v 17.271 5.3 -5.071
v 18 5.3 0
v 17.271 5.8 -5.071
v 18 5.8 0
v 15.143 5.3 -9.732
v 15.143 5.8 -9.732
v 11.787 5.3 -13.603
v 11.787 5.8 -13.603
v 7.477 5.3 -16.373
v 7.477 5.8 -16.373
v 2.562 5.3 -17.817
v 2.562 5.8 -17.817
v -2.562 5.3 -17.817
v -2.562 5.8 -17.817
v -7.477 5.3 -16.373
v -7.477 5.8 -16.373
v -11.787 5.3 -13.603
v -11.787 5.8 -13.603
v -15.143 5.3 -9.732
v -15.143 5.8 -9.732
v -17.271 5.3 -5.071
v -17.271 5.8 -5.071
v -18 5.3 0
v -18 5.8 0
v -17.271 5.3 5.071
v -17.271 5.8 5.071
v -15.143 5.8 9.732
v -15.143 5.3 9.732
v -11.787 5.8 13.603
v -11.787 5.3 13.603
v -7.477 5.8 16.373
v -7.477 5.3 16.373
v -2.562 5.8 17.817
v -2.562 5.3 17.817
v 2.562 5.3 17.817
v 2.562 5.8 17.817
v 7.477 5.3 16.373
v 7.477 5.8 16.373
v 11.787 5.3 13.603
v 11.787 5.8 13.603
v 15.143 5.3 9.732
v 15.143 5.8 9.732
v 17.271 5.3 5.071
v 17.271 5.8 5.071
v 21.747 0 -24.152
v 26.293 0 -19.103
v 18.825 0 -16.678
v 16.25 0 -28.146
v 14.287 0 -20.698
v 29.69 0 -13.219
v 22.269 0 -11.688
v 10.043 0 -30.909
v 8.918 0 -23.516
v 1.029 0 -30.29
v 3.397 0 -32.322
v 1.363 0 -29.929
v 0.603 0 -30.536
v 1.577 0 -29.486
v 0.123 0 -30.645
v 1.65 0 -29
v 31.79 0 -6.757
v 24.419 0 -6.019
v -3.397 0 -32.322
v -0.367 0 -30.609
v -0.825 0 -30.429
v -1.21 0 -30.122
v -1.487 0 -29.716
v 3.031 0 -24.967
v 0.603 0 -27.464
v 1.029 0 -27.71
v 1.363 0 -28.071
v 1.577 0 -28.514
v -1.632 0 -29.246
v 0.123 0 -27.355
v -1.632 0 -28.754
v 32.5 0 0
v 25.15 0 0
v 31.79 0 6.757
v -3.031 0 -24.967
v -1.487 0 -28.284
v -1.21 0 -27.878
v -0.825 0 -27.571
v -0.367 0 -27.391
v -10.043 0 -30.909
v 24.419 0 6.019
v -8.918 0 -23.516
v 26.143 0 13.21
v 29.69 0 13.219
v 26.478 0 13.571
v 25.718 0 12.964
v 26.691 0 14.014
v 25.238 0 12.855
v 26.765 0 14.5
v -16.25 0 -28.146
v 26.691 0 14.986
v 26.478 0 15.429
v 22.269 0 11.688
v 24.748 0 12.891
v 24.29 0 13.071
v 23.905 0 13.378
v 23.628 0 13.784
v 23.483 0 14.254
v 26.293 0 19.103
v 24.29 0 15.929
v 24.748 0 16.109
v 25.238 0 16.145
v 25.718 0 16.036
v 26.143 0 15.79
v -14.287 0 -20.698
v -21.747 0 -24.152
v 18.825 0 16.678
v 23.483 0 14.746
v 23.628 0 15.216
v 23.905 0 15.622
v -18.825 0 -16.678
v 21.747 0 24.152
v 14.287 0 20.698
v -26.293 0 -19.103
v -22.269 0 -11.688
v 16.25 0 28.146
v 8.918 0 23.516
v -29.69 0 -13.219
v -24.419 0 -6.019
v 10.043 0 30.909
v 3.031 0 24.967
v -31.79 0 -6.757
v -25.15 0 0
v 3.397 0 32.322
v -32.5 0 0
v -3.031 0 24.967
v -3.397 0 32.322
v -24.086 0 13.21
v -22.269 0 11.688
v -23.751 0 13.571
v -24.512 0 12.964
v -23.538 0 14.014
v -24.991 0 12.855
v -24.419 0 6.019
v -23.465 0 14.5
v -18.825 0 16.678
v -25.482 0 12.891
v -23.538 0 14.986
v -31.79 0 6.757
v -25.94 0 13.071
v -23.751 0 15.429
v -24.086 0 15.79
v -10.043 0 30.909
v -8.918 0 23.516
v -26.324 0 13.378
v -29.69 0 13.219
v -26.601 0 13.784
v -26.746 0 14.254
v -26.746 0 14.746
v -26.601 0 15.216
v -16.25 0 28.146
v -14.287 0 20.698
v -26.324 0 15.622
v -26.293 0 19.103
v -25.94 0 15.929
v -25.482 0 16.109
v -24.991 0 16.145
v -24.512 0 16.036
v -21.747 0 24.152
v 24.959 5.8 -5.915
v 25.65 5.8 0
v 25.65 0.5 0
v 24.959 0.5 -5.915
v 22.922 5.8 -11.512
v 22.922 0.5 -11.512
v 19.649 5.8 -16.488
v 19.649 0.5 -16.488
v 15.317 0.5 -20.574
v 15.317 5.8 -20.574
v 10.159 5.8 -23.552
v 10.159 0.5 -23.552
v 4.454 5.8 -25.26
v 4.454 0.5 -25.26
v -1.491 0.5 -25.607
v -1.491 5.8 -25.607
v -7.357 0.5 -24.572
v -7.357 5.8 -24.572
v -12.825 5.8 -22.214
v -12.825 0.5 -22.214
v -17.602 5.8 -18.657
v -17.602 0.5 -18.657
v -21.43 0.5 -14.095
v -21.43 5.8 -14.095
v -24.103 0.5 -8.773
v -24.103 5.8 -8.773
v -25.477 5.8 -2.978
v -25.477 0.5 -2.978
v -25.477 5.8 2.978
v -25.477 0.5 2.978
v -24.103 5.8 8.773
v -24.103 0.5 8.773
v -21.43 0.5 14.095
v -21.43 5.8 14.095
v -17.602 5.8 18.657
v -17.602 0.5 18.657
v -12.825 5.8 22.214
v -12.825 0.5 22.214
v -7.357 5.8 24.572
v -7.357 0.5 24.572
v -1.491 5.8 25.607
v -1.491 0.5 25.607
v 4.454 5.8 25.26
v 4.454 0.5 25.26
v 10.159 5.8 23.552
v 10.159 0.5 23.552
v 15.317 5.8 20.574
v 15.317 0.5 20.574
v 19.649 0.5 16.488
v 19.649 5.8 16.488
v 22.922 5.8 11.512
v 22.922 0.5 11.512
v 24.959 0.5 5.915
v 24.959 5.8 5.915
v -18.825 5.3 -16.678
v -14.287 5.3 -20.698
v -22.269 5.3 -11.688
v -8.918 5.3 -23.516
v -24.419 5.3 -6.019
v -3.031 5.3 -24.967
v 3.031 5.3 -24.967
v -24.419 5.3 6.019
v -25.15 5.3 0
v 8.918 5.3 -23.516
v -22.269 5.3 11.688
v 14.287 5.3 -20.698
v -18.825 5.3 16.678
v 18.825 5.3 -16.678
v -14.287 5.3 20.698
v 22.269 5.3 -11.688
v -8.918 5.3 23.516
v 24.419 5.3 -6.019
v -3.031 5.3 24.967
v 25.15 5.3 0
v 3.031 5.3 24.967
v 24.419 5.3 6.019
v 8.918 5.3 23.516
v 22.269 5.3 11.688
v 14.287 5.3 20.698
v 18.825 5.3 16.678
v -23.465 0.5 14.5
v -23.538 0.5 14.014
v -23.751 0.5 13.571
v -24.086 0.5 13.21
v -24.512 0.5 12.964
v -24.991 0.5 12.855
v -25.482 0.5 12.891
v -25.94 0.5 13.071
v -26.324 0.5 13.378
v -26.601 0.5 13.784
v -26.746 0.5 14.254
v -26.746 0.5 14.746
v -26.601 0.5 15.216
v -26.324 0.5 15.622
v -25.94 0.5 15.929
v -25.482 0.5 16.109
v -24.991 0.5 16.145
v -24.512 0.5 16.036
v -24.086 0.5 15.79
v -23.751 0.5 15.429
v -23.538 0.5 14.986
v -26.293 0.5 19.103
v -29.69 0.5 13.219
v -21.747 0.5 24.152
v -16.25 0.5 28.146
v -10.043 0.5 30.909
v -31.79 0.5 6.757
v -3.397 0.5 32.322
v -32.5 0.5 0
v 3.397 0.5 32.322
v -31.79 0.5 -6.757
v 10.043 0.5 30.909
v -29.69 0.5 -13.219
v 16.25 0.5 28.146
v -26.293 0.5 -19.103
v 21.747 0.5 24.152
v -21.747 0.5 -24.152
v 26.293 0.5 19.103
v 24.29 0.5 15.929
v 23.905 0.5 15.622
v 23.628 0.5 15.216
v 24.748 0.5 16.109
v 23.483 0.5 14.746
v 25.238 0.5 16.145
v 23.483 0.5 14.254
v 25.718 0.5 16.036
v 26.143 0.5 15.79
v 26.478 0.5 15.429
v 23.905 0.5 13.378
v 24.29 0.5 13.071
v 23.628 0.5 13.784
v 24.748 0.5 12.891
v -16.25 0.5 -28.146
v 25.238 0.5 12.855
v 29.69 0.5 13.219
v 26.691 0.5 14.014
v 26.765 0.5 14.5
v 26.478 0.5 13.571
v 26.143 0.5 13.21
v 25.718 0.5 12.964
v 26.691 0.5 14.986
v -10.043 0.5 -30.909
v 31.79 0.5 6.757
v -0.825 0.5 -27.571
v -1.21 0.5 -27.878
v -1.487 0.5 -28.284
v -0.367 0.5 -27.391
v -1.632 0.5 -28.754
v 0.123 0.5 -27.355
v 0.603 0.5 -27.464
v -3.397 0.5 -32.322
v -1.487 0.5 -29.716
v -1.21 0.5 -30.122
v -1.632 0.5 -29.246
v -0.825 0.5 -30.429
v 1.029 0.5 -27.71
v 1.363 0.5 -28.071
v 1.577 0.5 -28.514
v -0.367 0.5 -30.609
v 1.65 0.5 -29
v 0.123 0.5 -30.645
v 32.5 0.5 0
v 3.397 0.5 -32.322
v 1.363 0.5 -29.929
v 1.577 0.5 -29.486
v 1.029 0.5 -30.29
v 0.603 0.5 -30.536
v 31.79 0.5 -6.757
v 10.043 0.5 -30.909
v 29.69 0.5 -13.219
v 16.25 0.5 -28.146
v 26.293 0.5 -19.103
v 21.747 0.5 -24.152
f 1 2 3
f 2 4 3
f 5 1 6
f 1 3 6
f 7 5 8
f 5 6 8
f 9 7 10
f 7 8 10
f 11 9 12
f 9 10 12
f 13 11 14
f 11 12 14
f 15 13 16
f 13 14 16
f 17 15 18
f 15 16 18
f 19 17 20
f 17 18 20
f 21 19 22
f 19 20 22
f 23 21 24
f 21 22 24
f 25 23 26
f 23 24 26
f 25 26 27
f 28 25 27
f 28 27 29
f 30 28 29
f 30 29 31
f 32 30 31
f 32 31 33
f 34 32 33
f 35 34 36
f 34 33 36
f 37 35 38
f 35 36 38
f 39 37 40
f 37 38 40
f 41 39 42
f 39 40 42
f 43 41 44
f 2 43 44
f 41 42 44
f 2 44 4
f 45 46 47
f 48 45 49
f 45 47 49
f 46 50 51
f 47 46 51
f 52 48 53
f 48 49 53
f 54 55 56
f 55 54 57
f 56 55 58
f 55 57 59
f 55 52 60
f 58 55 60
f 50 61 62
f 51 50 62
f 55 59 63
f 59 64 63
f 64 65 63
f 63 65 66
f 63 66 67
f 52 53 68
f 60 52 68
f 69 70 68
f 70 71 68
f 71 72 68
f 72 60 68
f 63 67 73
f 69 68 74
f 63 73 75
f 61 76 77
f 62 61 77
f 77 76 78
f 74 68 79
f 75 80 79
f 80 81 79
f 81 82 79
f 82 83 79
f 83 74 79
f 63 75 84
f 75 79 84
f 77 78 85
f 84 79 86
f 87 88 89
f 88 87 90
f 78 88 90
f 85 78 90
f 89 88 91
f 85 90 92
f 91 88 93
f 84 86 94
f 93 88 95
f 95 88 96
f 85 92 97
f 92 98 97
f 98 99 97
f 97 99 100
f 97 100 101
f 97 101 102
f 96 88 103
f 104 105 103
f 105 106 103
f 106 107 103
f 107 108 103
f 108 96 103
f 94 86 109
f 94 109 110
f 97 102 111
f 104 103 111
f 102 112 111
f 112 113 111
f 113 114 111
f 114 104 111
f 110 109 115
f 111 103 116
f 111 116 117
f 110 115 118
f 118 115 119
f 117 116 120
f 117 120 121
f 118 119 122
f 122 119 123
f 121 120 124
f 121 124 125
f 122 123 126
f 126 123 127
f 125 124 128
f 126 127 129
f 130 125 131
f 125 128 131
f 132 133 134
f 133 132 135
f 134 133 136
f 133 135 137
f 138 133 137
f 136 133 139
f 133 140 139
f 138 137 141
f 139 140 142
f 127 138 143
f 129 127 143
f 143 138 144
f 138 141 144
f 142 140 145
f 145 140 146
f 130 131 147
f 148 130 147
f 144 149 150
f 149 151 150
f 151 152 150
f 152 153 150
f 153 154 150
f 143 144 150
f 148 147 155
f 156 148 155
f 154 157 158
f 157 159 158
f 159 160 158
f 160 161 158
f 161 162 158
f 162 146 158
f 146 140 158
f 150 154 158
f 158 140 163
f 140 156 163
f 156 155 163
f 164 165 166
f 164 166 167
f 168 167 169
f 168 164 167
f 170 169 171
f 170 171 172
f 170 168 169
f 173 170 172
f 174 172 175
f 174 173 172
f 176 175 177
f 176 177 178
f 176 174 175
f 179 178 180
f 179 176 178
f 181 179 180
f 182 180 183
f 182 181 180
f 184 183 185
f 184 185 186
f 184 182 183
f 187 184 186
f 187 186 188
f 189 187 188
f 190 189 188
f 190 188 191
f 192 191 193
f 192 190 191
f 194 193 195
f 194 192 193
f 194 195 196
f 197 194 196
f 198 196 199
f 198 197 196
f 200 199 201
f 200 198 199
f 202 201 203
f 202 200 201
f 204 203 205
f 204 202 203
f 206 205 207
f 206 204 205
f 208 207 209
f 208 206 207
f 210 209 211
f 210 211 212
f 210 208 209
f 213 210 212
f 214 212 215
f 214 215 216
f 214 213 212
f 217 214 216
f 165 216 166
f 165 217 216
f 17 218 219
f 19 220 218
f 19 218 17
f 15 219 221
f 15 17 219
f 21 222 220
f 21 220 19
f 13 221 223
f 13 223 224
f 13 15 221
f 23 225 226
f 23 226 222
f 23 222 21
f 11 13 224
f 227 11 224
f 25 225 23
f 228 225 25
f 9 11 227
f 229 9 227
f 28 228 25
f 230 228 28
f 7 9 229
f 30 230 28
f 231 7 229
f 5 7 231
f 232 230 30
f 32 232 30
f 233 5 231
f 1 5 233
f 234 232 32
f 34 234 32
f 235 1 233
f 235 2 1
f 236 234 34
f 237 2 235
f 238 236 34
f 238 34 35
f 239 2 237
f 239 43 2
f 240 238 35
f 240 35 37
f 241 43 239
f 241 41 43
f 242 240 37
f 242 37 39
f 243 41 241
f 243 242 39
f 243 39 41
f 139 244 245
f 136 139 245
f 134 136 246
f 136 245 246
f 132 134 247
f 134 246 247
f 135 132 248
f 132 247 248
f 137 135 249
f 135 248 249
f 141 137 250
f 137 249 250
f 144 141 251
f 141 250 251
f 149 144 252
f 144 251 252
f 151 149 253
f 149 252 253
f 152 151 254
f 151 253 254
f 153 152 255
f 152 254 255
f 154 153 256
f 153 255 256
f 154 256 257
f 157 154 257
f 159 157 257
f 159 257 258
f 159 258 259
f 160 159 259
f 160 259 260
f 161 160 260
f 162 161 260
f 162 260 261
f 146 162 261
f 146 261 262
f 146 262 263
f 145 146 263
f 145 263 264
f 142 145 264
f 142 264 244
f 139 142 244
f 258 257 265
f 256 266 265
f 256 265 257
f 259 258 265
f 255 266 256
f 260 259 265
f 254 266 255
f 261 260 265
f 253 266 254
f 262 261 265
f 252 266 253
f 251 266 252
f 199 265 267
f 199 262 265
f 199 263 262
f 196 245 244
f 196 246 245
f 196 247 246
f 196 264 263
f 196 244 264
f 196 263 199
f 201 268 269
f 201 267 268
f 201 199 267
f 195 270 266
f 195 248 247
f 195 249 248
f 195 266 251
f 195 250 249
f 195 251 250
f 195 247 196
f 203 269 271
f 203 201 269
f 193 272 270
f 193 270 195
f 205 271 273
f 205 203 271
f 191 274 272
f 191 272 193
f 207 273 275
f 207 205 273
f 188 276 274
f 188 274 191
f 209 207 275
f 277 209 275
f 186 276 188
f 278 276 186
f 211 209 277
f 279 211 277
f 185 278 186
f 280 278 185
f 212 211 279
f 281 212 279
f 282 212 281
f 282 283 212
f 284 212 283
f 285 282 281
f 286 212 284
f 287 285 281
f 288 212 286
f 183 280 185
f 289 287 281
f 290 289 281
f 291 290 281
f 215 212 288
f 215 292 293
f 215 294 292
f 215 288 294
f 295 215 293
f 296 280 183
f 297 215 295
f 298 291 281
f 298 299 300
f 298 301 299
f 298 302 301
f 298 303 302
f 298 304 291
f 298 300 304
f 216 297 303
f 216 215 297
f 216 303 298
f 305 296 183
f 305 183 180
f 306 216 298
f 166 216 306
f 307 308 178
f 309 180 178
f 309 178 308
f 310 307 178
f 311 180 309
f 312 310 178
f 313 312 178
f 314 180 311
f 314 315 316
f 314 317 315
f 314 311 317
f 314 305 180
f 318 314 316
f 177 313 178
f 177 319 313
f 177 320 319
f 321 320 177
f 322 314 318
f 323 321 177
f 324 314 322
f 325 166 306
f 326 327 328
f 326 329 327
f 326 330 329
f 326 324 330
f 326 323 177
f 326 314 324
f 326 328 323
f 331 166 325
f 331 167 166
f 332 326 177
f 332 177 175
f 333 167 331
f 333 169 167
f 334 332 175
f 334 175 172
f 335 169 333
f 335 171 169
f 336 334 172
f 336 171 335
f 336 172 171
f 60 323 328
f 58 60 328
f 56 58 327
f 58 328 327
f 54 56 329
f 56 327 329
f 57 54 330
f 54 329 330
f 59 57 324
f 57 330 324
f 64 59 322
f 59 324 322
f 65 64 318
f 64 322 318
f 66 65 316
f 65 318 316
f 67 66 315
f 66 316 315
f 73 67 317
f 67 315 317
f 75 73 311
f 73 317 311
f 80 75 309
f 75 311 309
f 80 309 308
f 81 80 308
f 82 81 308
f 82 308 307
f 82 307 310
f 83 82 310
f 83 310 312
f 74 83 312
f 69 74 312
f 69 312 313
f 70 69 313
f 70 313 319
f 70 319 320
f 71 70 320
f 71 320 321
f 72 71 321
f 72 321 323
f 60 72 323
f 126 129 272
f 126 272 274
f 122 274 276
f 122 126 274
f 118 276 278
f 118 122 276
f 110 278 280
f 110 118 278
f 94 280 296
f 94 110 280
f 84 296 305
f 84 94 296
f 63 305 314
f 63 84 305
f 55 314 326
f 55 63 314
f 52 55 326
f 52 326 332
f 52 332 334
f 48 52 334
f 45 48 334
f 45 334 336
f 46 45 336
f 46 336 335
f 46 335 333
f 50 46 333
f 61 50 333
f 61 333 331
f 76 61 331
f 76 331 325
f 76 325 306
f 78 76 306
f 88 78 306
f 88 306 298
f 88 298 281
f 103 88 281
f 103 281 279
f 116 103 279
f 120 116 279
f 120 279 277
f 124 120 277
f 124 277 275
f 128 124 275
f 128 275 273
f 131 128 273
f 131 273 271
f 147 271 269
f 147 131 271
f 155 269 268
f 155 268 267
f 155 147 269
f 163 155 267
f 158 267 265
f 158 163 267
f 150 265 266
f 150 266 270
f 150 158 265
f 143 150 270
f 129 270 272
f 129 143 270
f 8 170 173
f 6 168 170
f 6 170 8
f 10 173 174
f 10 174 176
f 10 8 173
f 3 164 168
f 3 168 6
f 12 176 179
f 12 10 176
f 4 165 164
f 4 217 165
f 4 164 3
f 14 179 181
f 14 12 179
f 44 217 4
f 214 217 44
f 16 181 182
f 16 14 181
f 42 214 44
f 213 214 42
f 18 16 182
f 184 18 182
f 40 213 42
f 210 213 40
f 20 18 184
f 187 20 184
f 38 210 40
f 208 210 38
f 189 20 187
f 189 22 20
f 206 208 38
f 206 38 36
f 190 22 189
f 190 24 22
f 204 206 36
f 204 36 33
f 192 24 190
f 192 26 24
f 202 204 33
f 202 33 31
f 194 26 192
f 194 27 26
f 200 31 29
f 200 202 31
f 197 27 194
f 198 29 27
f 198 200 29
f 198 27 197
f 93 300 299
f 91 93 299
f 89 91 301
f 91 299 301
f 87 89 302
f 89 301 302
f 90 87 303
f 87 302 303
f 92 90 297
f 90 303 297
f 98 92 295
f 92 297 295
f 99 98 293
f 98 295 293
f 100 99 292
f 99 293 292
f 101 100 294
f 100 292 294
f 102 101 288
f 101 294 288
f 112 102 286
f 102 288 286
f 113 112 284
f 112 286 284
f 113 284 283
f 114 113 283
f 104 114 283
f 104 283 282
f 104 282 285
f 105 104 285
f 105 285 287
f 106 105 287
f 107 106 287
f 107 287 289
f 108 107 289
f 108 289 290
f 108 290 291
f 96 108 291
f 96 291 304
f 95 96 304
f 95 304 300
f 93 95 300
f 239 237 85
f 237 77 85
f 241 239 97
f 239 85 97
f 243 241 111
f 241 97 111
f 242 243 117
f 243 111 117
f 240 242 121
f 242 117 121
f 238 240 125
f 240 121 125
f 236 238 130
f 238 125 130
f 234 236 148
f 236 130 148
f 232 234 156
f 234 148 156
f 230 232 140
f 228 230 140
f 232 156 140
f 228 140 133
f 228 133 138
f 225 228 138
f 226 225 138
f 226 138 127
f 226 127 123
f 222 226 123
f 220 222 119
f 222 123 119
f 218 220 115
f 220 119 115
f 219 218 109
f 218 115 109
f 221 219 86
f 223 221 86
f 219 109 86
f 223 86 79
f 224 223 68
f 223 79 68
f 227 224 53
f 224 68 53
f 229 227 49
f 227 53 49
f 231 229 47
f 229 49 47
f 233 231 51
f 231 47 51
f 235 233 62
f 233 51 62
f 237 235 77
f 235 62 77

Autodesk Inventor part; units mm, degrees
ref_plane "YZ Plane" through (0, 0, 0) normal (1, 0, 0) x (0, 1, 0)
ref_plane "XZ Plane" through (0, 0, 0) normal (0, 1, 0) x (-1, 0, 0)
ref_plane "XY Plane" through (0, 0, 0) normal (0, 0, 1) x (1, 0, 0)
sketch "スケッチ1" plane through (0, 0, 0) normal (0, 1, 0) x (-1, 0, 0)
  circle A0 centre (0, 0) radius 32.5
  dimension "d0" = 65
extrude "押し出し1" add sketch "スケッチ1" along normal blind 5.8
sketch "スケッチ2" plane through (0, 5.8, 0) normal (0, 1, 0) x (1, 0, 0)
  circle A0 centre (0, 0) radius 18
  dimension "d3" = 36
extrude "押し出し2" cut sketch "スケッチ2" against normal through all
sketch "スケッチ3" plane through (0, 0, 0) normal (0, -1, 0) x (1, 0, 0)
  circle A0 centre (0, 0) radius 25.15
  dimension "d6" = 50.3
extrude "押し出し3" cut sketch "スケッチ3" against normal blind 5.3
sketch "スケッチ4" plane through (0, 5.8, 0) normal (0, 1, 0) x (1, 0, 0)
  circle A0 centre (0, 0) radius 32.5
  circle A1 centre (0, 0) radius 25.65
  dimension "d9" = 51.3
extrude "押し出し4" cut sketch "スケッチ4" against normal blind 5.3
sketch "スケッチ5" plane through (0, 0.5, 0) normal (0, 1, 0) x (1, 0, 0)
  circle A0 centre (0, 29) radius 1.65
  circle A1 centre (-25.1147, -14.5) radius 1.65
  circle A2 centre (25.1147, -14.5) radius 1.65
  point P0 (0, 0)
  dimension "d12" = 3.3
  dimension "d13" = 29
  dimension "d16" = 360
extrude "押し出し5" cut sketch "スケッチ5" against normal through all
properties part number "clamp_for_bearing" material "ステンレス鋼"
